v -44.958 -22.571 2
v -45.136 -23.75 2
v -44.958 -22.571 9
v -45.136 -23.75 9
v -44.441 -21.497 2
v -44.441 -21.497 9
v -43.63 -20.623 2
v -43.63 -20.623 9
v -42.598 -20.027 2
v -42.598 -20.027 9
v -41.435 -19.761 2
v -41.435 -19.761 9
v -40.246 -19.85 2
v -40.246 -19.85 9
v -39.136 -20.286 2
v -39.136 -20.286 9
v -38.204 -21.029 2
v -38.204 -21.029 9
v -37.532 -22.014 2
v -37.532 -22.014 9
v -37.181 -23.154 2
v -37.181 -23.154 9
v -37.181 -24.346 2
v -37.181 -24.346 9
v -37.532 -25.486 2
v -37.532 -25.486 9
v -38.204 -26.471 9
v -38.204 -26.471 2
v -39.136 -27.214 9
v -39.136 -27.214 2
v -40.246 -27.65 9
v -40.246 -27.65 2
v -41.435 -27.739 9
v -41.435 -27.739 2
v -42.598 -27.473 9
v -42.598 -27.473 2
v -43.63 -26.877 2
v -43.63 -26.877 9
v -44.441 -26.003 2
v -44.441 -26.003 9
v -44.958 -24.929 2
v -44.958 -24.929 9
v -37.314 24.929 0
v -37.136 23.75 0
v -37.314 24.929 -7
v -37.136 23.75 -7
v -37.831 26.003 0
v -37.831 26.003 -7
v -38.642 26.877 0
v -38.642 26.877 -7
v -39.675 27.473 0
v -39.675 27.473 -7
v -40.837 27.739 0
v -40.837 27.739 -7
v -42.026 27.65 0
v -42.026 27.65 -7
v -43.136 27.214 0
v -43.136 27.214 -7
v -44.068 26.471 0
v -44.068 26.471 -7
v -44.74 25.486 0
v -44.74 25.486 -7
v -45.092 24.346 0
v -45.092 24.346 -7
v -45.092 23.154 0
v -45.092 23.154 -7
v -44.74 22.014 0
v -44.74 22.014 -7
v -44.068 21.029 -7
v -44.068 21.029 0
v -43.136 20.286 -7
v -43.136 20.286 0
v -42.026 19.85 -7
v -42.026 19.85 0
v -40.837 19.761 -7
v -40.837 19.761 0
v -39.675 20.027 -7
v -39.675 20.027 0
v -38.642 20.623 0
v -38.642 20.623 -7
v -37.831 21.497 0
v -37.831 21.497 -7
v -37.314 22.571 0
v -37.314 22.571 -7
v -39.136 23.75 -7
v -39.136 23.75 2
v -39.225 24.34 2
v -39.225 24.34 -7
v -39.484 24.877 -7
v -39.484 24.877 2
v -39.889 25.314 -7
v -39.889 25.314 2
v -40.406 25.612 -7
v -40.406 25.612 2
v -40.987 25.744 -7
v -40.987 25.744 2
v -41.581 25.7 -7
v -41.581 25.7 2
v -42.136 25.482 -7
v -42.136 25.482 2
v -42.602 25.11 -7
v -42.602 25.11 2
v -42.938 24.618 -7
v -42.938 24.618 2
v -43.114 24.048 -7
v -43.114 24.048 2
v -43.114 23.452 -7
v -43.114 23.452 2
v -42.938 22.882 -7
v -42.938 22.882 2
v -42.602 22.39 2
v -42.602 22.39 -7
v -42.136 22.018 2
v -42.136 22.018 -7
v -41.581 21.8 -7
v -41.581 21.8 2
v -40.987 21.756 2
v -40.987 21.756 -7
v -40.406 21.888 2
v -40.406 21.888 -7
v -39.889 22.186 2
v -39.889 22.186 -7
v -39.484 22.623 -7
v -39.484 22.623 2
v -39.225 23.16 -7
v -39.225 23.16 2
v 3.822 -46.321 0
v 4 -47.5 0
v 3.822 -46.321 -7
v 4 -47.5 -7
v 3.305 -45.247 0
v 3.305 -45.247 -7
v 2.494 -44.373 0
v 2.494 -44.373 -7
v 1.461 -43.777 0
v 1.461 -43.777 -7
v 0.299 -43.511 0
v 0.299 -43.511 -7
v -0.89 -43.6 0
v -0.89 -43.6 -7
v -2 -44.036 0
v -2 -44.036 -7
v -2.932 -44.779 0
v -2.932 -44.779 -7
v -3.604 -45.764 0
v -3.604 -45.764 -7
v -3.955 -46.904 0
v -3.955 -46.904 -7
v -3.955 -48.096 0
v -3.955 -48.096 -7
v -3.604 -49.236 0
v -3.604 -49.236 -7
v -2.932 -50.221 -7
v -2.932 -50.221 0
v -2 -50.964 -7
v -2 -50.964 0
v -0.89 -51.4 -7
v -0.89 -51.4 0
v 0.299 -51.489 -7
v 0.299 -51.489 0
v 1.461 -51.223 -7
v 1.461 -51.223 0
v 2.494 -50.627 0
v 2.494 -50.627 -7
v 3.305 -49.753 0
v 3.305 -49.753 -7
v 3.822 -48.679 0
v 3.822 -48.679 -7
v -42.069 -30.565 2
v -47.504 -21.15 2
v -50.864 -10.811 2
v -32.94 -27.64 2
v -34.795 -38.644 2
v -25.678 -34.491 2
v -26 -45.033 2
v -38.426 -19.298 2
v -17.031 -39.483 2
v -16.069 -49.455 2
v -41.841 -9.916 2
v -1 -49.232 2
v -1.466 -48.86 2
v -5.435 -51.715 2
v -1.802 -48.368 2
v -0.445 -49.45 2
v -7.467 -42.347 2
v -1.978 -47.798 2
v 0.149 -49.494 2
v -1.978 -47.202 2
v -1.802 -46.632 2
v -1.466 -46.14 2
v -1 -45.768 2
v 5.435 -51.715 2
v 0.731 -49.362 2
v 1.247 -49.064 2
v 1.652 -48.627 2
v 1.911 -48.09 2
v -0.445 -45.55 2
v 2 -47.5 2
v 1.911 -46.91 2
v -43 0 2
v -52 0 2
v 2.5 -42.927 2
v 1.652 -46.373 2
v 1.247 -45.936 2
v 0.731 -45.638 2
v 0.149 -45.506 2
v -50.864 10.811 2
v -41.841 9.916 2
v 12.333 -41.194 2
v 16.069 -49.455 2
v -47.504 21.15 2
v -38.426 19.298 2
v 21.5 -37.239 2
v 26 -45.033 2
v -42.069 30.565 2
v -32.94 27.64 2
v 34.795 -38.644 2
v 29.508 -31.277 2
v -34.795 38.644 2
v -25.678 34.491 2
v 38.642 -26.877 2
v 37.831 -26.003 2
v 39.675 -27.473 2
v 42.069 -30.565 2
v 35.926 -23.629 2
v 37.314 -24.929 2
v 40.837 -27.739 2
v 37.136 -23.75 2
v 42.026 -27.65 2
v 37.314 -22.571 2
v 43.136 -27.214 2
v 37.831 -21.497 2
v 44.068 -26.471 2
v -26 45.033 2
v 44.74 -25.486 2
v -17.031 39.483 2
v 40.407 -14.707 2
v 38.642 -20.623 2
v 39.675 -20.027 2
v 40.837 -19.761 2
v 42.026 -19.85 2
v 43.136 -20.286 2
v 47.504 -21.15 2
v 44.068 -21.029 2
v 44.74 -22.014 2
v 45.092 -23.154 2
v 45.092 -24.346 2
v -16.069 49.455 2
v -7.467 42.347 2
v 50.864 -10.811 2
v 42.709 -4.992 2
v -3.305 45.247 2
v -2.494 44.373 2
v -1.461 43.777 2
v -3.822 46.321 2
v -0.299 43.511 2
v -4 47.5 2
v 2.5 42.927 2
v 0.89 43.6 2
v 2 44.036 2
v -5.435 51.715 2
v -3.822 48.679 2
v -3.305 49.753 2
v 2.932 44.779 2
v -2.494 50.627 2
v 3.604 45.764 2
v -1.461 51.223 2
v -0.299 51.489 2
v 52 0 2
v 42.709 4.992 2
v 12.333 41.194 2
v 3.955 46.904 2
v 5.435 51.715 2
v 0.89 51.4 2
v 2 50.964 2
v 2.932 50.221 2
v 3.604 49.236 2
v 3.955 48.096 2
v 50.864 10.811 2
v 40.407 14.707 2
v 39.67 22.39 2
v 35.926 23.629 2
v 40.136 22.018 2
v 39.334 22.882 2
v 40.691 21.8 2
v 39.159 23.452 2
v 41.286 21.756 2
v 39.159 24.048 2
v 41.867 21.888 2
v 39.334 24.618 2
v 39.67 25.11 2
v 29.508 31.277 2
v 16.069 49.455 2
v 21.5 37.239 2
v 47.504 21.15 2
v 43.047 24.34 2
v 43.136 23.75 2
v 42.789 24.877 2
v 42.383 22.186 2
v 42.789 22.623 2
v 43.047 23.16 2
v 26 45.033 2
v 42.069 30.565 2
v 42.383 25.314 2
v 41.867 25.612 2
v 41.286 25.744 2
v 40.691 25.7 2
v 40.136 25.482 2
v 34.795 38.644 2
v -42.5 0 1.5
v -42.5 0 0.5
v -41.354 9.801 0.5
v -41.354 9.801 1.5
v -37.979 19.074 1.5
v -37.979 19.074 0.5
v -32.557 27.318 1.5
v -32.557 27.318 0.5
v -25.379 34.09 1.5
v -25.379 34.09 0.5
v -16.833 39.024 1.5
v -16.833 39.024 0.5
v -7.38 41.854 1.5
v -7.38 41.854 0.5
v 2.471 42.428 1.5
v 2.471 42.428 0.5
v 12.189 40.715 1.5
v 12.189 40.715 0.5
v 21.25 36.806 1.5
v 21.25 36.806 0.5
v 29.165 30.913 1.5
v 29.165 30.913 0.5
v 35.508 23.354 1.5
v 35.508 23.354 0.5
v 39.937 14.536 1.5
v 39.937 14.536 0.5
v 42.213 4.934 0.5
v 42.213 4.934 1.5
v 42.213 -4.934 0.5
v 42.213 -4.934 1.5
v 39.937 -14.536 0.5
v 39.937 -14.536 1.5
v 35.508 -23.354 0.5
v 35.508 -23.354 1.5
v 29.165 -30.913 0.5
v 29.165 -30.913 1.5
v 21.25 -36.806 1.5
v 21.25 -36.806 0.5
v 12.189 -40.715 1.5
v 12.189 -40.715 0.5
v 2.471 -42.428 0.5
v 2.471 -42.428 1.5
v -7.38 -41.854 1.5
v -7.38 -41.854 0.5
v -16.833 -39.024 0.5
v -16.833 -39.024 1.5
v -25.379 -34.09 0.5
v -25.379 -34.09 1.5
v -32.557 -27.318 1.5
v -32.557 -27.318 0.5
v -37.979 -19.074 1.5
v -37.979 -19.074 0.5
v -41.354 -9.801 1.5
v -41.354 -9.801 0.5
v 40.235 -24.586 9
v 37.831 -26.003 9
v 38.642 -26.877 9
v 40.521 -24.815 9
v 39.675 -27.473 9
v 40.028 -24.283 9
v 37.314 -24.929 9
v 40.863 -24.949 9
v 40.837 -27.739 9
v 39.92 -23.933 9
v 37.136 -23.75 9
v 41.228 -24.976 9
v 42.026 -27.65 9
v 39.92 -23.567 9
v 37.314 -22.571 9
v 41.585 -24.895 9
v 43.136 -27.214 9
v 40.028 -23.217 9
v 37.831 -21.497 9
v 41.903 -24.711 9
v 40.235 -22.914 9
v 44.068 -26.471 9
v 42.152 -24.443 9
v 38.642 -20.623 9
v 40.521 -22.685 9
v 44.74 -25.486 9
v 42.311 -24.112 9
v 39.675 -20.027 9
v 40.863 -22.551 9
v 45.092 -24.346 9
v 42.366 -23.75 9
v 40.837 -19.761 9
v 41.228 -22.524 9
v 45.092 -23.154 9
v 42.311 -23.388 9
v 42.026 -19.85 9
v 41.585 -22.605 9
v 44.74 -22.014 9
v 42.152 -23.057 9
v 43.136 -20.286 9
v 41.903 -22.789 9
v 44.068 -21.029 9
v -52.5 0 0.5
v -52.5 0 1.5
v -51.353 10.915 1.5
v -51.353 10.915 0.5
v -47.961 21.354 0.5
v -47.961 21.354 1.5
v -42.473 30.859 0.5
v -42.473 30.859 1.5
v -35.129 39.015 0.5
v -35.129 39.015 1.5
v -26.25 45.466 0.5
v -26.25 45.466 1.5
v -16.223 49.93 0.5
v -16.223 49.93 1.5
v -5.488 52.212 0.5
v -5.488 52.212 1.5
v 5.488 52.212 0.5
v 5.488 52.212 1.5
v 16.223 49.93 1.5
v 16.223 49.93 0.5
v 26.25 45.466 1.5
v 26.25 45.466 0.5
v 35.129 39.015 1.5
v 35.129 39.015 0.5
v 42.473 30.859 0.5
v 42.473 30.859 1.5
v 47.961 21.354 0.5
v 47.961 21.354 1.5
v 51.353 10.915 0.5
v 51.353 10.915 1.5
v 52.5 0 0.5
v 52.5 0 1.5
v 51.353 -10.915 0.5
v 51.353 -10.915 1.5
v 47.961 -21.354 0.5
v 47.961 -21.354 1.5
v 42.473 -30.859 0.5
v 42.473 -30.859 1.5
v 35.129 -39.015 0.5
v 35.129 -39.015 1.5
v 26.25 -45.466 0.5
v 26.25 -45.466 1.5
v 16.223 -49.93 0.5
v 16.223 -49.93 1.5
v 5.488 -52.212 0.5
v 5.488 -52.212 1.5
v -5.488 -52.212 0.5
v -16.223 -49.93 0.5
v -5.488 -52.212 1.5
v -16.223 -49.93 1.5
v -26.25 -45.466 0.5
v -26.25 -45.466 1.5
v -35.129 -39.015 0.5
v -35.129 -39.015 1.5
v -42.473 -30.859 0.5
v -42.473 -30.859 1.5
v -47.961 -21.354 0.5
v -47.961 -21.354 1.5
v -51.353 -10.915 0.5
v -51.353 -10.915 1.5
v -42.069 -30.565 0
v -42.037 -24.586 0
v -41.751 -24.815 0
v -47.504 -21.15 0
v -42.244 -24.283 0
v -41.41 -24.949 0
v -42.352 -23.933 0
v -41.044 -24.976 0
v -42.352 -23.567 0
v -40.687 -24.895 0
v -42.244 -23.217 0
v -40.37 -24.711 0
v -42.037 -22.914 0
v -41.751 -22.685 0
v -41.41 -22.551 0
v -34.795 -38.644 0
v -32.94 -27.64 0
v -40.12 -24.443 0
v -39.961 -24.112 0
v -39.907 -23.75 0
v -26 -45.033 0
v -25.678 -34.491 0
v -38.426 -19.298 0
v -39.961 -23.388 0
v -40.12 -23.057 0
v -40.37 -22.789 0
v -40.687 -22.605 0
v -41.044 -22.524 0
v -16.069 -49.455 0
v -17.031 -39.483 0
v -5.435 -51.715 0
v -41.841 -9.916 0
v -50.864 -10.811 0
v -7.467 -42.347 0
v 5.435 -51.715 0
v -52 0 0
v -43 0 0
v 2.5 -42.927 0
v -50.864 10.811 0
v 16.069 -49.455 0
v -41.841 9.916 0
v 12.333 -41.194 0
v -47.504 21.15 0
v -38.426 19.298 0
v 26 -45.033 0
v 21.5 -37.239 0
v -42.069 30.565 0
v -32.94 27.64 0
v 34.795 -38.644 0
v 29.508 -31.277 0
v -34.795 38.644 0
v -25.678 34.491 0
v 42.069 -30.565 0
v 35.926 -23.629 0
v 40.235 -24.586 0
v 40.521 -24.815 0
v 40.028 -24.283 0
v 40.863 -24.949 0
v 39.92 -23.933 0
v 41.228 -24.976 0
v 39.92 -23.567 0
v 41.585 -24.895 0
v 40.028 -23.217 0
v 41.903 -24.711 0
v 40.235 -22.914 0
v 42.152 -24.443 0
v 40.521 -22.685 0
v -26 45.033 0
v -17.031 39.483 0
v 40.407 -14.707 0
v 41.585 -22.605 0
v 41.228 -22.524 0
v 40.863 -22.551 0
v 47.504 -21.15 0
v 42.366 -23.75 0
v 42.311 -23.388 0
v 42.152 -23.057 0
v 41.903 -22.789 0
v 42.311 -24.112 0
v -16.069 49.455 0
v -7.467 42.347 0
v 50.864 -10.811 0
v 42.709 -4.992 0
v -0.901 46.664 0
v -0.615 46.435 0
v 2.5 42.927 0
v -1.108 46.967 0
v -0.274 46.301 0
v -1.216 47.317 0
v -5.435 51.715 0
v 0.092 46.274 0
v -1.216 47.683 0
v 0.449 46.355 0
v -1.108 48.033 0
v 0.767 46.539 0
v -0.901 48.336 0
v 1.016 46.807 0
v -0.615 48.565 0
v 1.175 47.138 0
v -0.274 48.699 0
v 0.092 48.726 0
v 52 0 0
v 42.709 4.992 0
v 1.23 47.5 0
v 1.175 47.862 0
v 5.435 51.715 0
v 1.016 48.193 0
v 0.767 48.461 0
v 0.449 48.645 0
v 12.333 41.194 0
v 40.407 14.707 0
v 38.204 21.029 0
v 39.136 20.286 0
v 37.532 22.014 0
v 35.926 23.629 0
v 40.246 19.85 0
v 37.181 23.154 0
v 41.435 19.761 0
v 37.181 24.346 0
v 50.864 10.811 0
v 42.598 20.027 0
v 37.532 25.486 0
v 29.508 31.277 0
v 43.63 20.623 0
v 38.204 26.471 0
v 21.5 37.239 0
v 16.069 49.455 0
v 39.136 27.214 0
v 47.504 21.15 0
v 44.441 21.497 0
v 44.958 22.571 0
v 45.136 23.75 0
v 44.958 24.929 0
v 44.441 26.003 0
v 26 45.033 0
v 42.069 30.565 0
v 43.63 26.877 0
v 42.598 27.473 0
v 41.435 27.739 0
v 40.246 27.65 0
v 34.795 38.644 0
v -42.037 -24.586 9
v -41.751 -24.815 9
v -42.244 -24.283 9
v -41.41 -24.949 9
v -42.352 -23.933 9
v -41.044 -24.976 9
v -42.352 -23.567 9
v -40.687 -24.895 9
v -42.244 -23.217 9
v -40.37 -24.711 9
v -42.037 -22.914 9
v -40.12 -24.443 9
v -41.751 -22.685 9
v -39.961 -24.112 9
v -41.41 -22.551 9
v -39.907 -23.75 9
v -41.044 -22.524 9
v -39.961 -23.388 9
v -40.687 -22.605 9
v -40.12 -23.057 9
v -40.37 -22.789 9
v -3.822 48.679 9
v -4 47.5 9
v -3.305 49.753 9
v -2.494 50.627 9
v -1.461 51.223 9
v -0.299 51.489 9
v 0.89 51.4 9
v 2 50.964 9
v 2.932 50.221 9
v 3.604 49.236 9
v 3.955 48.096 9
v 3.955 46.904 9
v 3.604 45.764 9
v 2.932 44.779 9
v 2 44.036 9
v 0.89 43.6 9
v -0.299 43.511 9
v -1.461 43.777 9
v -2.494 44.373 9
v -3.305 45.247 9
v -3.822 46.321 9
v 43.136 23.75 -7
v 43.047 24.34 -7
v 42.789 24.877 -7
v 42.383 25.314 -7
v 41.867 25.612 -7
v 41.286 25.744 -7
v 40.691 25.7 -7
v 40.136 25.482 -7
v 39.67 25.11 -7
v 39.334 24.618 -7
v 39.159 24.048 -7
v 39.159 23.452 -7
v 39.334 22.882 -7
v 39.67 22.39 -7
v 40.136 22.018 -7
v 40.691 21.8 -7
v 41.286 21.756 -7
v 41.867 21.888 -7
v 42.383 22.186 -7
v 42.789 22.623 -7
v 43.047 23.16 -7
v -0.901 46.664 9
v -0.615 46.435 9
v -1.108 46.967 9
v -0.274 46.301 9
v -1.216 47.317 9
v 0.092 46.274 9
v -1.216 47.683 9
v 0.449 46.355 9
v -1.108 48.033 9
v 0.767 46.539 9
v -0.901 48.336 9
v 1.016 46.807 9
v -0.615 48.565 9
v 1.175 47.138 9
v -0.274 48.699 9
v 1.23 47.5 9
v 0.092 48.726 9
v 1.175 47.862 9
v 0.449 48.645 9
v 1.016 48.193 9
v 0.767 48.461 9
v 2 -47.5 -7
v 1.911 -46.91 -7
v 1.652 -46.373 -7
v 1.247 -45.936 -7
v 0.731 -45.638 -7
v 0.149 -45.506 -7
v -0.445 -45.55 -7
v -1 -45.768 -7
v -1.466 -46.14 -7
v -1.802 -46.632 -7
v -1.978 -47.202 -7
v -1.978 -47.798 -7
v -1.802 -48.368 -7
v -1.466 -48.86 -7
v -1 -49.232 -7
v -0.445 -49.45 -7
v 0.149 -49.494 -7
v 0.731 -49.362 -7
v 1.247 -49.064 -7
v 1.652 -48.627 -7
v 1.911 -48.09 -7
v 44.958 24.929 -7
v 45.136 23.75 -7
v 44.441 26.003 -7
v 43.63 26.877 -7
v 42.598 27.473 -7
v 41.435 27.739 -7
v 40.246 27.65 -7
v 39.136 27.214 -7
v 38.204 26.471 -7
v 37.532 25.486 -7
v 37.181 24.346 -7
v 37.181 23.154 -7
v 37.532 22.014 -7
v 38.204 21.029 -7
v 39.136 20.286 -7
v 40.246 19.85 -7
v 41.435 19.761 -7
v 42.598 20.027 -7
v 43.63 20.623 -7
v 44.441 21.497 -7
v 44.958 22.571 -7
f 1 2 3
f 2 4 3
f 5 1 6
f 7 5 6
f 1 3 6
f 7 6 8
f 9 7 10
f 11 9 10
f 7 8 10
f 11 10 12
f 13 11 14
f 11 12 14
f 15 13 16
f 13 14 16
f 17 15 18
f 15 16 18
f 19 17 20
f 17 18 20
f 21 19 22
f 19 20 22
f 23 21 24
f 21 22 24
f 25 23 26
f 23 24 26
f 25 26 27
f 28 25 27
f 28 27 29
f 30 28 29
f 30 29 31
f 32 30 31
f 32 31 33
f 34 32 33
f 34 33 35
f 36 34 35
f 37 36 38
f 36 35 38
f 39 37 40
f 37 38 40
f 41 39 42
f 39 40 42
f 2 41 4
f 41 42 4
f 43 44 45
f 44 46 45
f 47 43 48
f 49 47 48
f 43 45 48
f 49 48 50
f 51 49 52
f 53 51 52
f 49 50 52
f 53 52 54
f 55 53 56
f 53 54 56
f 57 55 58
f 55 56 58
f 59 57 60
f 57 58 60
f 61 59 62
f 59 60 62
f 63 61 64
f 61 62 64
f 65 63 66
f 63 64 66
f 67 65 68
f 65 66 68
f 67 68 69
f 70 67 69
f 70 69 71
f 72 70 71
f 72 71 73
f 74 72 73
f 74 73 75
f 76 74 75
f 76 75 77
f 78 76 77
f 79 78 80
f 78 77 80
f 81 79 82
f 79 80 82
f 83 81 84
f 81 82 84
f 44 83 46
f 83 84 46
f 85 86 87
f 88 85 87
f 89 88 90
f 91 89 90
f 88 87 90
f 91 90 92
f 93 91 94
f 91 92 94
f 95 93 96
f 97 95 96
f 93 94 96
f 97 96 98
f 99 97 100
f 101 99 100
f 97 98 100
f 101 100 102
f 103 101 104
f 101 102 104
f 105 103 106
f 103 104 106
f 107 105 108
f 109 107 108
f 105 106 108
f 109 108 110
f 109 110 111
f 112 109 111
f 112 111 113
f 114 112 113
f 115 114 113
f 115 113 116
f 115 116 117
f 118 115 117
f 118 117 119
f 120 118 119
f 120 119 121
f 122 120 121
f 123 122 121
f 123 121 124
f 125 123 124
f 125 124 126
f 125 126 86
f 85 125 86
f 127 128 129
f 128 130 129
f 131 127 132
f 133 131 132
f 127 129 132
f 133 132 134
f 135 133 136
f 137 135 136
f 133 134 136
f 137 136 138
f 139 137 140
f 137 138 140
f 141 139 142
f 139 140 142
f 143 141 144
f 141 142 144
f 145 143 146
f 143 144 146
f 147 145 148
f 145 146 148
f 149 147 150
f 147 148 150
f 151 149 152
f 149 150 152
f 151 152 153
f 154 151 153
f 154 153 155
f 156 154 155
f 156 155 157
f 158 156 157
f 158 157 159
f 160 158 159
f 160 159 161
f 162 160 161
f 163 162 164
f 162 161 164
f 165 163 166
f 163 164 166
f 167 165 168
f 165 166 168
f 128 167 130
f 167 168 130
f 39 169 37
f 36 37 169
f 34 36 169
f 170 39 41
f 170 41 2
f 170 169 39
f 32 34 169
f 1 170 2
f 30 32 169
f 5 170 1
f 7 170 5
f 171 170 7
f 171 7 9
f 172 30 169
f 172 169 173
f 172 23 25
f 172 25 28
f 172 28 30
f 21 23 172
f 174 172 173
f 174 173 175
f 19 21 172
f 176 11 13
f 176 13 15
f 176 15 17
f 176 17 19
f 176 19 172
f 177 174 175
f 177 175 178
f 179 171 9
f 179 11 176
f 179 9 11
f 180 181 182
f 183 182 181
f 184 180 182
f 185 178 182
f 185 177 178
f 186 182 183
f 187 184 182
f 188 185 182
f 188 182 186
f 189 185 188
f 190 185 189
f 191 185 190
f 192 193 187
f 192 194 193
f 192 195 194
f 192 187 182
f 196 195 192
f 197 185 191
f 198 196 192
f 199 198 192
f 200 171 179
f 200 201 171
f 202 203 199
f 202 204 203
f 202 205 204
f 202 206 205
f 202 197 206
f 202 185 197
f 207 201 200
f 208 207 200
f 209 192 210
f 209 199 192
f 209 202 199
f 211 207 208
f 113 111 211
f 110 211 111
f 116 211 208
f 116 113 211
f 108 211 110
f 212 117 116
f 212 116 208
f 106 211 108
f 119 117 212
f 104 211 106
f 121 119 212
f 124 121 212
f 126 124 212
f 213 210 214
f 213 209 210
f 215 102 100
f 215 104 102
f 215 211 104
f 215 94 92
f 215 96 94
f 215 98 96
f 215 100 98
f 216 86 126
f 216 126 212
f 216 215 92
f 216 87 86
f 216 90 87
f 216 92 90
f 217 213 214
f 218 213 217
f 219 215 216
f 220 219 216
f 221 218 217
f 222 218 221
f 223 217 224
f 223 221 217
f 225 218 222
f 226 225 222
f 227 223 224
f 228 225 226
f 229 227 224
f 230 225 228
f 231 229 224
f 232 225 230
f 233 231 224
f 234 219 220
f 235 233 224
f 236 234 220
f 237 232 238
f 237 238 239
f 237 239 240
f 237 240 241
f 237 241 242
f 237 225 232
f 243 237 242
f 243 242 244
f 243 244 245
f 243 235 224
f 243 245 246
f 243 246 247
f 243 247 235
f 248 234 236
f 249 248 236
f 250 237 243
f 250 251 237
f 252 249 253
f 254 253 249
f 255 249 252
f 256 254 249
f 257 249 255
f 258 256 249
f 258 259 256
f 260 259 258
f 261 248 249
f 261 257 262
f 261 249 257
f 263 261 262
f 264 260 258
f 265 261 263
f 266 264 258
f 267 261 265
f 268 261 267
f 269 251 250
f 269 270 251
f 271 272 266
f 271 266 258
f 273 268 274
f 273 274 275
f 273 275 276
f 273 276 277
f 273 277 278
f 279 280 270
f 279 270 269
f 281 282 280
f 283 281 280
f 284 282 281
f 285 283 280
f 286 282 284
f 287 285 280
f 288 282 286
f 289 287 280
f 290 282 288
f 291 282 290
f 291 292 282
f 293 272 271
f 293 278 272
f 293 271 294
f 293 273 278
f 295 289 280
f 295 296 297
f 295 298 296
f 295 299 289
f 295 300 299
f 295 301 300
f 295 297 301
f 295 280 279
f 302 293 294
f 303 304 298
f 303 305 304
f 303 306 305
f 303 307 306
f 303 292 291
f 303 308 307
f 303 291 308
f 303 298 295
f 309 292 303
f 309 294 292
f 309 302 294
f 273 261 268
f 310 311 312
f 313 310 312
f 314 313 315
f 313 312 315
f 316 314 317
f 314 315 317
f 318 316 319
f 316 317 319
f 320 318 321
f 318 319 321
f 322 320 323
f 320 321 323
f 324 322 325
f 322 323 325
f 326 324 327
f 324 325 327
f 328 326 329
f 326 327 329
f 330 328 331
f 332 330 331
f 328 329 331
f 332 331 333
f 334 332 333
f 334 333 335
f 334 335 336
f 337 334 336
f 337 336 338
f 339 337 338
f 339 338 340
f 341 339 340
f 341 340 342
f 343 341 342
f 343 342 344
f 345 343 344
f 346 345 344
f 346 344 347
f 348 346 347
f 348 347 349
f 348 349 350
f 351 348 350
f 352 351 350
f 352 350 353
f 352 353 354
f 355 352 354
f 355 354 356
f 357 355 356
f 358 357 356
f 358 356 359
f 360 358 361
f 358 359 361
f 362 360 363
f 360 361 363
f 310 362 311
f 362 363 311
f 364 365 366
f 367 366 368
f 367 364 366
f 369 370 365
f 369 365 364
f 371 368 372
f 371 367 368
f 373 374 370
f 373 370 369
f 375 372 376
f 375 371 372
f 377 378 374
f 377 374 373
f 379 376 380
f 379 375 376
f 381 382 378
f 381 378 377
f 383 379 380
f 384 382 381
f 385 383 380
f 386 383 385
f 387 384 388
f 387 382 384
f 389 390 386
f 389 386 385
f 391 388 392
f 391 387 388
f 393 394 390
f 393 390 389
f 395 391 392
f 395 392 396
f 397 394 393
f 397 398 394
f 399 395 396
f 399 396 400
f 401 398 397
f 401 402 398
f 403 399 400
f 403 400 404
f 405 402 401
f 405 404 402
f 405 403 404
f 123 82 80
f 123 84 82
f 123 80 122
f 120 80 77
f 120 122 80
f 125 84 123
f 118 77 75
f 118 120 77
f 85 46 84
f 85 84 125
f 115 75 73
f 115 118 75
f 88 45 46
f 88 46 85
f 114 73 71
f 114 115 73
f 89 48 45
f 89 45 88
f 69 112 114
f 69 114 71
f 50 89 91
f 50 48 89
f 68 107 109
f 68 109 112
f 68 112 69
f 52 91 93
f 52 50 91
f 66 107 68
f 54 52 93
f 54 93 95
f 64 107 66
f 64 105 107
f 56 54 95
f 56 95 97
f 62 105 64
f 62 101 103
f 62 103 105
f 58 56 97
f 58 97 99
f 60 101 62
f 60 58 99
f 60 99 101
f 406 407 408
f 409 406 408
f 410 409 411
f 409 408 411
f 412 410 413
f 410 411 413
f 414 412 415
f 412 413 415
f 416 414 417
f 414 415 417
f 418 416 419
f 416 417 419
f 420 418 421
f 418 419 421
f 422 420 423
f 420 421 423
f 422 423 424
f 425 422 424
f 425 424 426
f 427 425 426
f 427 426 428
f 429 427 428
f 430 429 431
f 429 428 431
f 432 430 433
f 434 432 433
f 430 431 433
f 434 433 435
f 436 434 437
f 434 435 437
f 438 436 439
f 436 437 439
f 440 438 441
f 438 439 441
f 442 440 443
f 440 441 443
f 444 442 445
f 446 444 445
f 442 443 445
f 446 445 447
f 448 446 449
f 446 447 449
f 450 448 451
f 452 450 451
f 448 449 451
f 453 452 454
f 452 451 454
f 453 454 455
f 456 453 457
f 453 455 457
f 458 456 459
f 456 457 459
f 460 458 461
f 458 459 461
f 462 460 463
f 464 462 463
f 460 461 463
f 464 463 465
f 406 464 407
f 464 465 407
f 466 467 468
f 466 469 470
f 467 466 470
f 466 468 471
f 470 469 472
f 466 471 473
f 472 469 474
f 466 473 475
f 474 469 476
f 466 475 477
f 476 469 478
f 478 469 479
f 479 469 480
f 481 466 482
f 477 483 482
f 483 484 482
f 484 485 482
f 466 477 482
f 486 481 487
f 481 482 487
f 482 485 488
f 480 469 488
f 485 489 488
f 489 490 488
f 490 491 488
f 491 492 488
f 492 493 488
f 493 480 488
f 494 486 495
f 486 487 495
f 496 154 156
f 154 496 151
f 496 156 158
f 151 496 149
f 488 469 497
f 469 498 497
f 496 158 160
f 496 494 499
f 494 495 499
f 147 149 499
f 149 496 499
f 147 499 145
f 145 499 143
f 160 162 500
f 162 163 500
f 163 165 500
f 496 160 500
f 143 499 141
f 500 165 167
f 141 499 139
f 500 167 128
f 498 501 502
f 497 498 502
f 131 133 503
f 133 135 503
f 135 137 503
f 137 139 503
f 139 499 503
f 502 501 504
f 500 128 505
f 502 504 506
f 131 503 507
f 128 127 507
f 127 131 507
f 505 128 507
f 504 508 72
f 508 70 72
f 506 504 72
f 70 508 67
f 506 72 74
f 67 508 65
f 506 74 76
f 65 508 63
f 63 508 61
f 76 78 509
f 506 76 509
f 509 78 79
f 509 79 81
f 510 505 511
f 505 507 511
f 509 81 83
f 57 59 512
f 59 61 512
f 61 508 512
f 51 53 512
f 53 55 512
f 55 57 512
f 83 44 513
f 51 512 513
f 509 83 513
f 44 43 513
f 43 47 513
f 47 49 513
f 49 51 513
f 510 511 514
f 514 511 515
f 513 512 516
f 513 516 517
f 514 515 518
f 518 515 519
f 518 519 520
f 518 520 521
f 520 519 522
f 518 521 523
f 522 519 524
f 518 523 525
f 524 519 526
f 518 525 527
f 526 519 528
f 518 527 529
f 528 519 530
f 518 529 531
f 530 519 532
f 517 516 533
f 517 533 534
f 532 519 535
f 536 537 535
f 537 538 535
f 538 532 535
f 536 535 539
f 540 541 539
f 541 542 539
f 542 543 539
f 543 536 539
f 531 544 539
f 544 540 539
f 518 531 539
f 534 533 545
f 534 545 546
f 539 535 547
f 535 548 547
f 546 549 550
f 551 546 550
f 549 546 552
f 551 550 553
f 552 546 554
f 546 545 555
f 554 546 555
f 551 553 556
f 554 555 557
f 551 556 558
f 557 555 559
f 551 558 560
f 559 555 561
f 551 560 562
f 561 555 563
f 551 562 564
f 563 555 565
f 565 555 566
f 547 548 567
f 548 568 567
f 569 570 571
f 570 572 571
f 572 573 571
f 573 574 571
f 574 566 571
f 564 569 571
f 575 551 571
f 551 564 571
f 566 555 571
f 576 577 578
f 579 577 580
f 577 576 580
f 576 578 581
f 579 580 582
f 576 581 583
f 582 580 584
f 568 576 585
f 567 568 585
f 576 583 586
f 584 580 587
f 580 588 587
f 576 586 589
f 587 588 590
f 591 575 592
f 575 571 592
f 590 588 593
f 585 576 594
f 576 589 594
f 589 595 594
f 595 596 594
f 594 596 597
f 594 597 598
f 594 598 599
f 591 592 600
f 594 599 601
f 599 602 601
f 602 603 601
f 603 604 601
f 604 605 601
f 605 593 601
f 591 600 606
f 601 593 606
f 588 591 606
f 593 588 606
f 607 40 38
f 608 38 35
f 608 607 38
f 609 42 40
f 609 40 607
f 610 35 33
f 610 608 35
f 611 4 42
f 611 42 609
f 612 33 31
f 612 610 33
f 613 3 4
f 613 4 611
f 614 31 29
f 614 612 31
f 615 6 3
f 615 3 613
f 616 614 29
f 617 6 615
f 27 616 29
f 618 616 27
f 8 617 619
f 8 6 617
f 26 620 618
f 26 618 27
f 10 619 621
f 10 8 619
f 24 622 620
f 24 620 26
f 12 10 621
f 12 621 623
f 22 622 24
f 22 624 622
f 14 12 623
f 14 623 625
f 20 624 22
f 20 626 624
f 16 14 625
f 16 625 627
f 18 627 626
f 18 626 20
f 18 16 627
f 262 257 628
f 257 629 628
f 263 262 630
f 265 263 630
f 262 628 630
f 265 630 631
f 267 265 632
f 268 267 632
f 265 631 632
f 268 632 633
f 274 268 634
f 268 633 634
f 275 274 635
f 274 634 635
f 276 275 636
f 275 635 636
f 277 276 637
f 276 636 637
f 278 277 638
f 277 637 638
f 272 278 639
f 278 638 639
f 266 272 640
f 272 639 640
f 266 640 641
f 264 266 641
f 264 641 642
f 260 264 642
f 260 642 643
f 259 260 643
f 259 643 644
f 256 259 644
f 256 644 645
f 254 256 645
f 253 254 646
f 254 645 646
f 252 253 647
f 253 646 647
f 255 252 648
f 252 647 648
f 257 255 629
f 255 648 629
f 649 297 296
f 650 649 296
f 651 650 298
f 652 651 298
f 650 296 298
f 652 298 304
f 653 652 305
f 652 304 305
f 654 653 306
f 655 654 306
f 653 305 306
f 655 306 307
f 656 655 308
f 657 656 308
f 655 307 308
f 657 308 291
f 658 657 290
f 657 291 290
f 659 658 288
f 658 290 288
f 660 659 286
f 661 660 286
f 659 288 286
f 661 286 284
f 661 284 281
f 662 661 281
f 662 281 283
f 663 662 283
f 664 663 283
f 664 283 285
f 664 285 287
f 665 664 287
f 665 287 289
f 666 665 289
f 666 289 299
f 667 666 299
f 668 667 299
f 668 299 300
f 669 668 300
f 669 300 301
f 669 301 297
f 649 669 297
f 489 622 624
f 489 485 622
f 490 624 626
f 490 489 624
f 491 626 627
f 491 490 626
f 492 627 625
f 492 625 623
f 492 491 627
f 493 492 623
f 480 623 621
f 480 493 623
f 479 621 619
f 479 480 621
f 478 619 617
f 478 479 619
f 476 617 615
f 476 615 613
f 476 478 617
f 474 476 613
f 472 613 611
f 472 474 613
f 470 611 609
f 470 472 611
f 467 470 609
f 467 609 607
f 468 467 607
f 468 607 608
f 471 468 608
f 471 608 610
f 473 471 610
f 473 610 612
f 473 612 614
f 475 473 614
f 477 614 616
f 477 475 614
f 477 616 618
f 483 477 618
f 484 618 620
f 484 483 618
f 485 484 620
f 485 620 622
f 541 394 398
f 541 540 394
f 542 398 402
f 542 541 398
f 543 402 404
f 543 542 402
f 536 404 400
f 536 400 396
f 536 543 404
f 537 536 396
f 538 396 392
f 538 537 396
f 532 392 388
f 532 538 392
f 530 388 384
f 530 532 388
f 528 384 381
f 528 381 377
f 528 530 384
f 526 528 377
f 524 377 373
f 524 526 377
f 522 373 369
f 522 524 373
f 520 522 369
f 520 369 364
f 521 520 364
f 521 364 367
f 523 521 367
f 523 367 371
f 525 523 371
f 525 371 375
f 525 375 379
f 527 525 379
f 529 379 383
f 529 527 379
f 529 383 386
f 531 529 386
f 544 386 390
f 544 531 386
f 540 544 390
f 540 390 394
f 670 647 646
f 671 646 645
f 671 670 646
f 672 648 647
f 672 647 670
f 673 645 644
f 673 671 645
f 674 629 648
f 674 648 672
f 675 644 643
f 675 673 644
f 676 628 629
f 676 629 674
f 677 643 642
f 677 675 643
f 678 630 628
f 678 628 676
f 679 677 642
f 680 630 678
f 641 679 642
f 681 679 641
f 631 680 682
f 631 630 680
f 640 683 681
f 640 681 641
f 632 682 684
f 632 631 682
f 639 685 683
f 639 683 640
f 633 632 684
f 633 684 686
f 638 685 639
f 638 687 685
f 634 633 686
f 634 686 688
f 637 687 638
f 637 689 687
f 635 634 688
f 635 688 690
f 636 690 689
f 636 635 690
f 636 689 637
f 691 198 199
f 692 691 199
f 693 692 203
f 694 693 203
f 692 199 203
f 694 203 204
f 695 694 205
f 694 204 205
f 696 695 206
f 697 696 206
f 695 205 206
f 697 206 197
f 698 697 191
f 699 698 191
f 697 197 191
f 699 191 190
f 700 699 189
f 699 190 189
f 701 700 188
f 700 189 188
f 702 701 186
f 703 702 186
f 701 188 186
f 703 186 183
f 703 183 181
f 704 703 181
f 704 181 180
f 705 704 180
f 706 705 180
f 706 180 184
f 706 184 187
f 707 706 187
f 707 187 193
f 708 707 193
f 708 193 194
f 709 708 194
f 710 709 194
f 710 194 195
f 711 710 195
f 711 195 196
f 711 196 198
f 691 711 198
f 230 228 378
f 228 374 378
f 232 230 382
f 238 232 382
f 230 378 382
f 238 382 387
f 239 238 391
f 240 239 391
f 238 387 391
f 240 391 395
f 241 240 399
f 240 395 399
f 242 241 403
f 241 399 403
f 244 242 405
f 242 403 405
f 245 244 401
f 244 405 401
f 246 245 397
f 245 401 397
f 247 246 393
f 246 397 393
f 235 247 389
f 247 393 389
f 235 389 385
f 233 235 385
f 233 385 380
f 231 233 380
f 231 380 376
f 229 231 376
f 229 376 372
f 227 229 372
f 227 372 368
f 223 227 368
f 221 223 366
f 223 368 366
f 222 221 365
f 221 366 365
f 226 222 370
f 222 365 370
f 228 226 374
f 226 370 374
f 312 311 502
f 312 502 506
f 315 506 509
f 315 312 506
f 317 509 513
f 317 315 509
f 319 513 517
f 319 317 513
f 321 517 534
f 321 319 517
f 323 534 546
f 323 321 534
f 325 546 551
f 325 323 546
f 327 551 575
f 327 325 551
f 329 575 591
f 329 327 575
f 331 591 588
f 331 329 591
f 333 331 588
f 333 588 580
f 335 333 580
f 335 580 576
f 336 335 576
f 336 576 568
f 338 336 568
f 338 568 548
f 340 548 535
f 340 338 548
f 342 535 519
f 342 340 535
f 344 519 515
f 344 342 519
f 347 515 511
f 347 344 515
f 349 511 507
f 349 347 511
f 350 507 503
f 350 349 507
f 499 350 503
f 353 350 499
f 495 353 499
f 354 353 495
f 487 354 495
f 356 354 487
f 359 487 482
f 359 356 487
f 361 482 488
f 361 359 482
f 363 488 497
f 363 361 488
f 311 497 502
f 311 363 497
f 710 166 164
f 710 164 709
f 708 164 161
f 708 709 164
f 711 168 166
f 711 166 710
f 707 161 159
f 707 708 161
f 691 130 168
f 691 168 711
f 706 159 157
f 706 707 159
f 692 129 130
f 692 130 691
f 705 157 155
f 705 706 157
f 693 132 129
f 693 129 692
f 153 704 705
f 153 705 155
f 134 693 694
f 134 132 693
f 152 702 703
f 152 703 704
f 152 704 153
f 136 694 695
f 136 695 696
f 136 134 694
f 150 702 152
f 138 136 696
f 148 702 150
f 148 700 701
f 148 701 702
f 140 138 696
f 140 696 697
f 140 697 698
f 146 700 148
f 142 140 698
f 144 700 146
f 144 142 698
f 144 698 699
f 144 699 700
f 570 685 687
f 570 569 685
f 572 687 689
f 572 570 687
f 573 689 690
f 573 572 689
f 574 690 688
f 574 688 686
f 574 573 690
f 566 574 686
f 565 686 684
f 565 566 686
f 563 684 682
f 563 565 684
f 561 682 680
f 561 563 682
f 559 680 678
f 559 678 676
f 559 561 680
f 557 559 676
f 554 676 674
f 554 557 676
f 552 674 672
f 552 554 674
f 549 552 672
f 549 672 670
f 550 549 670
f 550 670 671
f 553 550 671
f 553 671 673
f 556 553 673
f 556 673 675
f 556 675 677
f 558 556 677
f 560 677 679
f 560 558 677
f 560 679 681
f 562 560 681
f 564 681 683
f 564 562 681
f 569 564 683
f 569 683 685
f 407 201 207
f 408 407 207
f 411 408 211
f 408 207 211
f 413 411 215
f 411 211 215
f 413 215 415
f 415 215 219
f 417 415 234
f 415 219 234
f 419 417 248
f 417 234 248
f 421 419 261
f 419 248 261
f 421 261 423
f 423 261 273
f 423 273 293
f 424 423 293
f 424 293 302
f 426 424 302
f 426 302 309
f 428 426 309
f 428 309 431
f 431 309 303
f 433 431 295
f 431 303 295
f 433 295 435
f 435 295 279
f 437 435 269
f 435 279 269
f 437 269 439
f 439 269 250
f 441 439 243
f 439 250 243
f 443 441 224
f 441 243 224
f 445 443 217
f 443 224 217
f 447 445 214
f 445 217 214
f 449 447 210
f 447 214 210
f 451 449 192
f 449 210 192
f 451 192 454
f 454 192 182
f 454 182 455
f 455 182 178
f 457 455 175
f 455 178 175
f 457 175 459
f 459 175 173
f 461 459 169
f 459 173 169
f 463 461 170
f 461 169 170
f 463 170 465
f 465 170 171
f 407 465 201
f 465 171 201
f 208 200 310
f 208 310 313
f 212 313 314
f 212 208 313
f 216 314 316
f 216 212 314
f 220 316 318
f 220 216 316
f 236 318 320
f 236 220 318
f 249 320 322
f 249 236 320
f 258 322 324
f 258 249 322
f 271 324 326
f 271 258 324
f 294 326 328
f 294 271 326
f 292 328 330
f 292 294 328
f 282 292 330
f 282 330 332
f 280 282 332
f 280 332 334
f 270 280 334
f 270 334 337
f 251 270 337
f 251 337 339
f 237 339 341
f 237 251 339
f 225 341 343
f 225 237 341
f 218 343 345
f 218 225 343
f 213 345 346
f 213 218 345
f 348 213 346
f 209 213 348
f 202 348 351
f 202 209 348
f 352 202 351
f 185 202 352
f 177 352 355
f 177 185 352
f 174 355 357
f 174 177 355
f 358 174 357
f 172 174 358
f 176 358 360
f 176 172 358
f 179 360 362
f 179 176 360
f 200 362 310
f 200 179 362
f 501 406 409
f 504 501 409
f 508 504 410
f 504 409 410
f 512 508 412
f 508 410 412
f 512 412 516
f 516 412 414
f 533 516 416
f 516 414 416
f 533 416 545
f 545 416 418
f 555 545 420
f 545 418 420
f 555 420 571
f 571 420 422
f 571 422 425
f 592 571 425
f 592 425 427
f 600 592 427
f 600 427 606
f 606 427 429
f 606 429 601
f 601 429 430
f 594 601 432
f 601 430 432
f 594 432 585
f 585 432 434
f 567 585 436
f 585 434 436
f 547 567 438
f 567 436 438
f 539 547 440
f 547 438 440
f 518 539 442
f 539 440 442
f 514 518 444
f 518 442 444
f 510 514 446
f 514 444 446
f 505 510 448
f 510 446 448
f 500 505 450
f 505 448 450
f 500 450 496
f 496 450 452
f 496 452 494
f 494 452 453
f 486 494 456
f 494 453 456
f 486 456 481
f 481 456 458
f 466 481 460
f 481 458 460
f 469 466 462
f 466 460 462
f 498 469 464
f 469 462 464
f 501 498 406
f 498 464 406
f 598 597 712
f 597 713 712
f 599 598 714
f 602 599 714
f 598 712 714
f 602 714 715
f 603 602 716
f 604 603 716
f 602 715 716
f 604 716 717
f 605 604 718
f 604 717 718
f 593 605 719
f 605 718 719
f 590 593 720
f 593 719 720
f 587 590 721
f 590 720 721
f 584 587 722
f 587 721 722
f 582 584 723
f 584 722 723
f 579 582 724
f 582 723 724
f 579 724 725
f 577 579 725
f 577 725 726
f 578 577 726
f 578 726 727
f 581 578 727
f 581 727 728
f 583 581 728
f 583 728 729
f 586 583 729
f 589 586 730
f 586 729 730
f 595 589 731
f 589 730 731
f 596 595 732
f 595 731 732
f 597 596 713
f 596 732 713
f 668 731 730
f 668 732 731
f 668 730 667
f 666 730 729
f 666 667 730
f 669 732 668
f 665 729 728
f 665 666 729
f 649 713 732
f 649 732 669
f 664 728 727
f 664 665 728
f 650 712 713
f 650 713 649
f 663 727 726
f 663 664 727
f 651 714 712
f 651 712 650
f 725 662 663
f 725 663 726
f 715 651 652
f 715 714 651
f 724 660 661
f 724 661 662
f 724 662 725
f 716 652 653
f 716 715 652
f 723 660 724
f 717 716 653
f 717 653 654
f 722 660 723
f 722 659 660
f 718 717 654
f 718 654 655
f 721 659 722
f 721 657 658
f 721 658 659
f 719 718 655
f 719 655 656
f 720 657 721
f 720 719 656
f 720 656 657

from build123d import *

# Parameters (mm, degrees)
SKETCH1_W                 = 52.5
SKETCH1_H                 = 2
SKETCH2_W                 = 4
SKETCH2_H                 = 7
SKETCH3_W                 = 4
SKETCH3_H                 = 7
SKETCH4_W                 = 4
SKETCH4_H                 = 7
SKETCH5_W                 = 4
SKETCH5_H                 = 7
SKETCH6_W                 = 4
SKETCH6_H                 = 7
SKETCH7_W                 = 4
SKETCH7_H                 = 7
F_4_0_4_DIAMETER_HOLE1_D  = 4
M80_CLEARANCE_HOLE1_D     = 85
M80_CLEARANCE_HOLE1_DEPTH = 9
CHAMFER1_SIZE             = 0.5


with BuildPart() as part:
    # Sketch1 → Revolve1 (revolve)
    with BuildSketch(Plane.XZ, mode=Mode.PRIVATE) as revolve1_sk:
        with Locations((26.25, 1)):
            Rectangle(SKETCH1_W, SKETCH1_H)
    revolve(revolve1_sk.sketch.rotate(Axis((0, 0, 2), (0, 0, -1)), 180), axis=Axis((0, 0, 2), (0, 0, -1)))

    # Sketch2 → Revolve2 (revolve)
    with BuildSketch(Plane.XZ.offset(23.75), mode=Mode.PRIVATE) as revolve2_sk:
        with Locations((43.13620668, 5.5)):
            Rectangle(SKETCH2_W, SKETCH2_H)
    revolve(revolve2_sk.sketch.rotate(Axis((41.13620668, -23.75, 9), (0, 0, -1)), 180), axis=Axis((41.13620668, -23.75, 9), (0, 0, -1)))

    # Sketch3 → Revolve3 (revolve)
    with BuildSketch(Plane.XZ.offset(23.75), mode=Mode.PRIVATE) as revolve3_sk:
        with Locations((-39.13620668, 5.5)):
            Rectangle(SKETCH3_W, SKETCH3_H)
    revolve(revolve3_sk.sketch.rotate(Axis((-41.13620668, -23.75, 9), (0, 0, -1)), 180), axis=Axis((-41.13620668, -23.75, 9), (0, 0, -1)))

    # Sketch4 → Revolve4 (revolve)
    with BuildSketch(Plane.XZ.offset(-47.5), mode=Mode.PRIVATE) as revolve4_sk:
        with Locations((2, 5.5)):
            Rectangle(SKETCH4_W, SKETCH4_H)
    revolve(revolve4_sk.sketch.rotate(Axis((0, 47.5, 9), (0, 0, -1)), 180), axis=Axis((0, 47.5, 9), (0, 0, -1)))

    # Sketch5 → Revolve5 (revolve)
    with BuildSketch(Plane(origin=(0, 23.75, 0), x_dir=(1, 0, 0), z_dir=(0, 1, 0))):
        with Locations((43.13620668, 3.5)):
            Rectangle(SKETCH5_W, SKETCH5_H)
    revolve(axis=Axis((41.13620668, 23.75, -7), (0, 0, 1)))

    # Sketch6 → Revolve6 (revolve)
    with BuildSketch(Plane(origin=(0, 23.75, 0), x_dir=(1, 0, 0), z_dir=(0, 1, 0))):
        with Locations((-39.13620668, 3.5)):
            Rectangle(SKETCH6_W, SKETCH6_H)
    revolve(axis=Axis((-41.13620668, 23.75, -7), (0, 0, 1)))

    # Sketch7 → Revolve7 (revolve)
    with BuildSketch(Plane(origin=(0, -47.5, 0), x_dir=(1, 0, 0), z_dir=(0, 1, 0))):
        with Locations((2, 3.5)):
            Rectangle(SKETCH7_W, SKETCH7_H)
    revolve(axis=Axis((0, -47.5, -7), (0, 0, 1)))

    # Sketch8 → Cut-Revolve1 (revolve, cut)
    with BuildSketch(Plane(origin=(0, 47.5, 0), x_dir=(1, 0, 0), z_dir=(0, 1, 0))):
        Polygon((1.2295, 0), (0, 0), (0, -9), (1.2295, -9), (1.2295, -7), align=None)
    revolve(axis=Axis((0, 47.5, 0), (0, 0, 1)), mode=Mode.SUBTRACT)

    # Sketch9 → Cut-Revolve2 (revolve, cut)
    with BuildSketch(Plane(origin=(0, -23.75, 0), x_dir=(1, 0, 0), z_dir=(0, 1, 0))):
        Polygon((-39.90670668, 0), (-41.13620668, 0), (-41.13620668, -9), (-39.90670668, -9), (-39.90670668, -7), align=None)
    revolve(axis=Axis((-41.13620668, -23.75, 0), (0, 0, 1)), mode=Mode.SUBTRACT)

    # Sketch10 → Cut-Revolve3 (revolve, cut)
    with BuildSketch(Plane(origin=(0, -23.75, 0), x_dir=(1, 0, 0), z_dir=(0, 1, 0))):
        Polygon((42.36570668, 0), (41.13620668, 0), (41.13620668, -9), (42.36570668, -9), (42.36570668, -7), align=None)
    revolve(axis=Axis((41.13620668, -23.75, 0), (0, 0, 1)), mode=Mode.SUBTRACT)

    # Ø4.0 (4) Diameter Hole1 (through all)
    with Locations(Plane(origin=(0, 0, -7), x_dir=(-1, 0, 0), z_dir=(0, 0, -1))):
        with Locations((-41.13620668, 23.75), (0, -47.5), (41.13620668, 23.75)):
            Hole(F_4_0_4_DIAMETER_HOLE1_D / 2)

    # M80 Clearance Hole1
    with Locations(Plane.XY.offset(2)):
        with Locations((0, 0)):
            Hole(M80_CLEARANCE_HOLE1_D / 2, depth=M80_CLEARANCE_HOLE1_DEPTH)

    # Chamfer1
    chamfer1_edges = [part.edges().sort_by_distance(p)[0] for p in [
        (52.5, 0, 0),
        (52.5, 0, 2),
        (42.5, 0, 0),
        (42.5, 0, 2),
    ]]
    chamfer(chamfer1_edges, length=CHAMFER1_SIZE)


solid = part.part
